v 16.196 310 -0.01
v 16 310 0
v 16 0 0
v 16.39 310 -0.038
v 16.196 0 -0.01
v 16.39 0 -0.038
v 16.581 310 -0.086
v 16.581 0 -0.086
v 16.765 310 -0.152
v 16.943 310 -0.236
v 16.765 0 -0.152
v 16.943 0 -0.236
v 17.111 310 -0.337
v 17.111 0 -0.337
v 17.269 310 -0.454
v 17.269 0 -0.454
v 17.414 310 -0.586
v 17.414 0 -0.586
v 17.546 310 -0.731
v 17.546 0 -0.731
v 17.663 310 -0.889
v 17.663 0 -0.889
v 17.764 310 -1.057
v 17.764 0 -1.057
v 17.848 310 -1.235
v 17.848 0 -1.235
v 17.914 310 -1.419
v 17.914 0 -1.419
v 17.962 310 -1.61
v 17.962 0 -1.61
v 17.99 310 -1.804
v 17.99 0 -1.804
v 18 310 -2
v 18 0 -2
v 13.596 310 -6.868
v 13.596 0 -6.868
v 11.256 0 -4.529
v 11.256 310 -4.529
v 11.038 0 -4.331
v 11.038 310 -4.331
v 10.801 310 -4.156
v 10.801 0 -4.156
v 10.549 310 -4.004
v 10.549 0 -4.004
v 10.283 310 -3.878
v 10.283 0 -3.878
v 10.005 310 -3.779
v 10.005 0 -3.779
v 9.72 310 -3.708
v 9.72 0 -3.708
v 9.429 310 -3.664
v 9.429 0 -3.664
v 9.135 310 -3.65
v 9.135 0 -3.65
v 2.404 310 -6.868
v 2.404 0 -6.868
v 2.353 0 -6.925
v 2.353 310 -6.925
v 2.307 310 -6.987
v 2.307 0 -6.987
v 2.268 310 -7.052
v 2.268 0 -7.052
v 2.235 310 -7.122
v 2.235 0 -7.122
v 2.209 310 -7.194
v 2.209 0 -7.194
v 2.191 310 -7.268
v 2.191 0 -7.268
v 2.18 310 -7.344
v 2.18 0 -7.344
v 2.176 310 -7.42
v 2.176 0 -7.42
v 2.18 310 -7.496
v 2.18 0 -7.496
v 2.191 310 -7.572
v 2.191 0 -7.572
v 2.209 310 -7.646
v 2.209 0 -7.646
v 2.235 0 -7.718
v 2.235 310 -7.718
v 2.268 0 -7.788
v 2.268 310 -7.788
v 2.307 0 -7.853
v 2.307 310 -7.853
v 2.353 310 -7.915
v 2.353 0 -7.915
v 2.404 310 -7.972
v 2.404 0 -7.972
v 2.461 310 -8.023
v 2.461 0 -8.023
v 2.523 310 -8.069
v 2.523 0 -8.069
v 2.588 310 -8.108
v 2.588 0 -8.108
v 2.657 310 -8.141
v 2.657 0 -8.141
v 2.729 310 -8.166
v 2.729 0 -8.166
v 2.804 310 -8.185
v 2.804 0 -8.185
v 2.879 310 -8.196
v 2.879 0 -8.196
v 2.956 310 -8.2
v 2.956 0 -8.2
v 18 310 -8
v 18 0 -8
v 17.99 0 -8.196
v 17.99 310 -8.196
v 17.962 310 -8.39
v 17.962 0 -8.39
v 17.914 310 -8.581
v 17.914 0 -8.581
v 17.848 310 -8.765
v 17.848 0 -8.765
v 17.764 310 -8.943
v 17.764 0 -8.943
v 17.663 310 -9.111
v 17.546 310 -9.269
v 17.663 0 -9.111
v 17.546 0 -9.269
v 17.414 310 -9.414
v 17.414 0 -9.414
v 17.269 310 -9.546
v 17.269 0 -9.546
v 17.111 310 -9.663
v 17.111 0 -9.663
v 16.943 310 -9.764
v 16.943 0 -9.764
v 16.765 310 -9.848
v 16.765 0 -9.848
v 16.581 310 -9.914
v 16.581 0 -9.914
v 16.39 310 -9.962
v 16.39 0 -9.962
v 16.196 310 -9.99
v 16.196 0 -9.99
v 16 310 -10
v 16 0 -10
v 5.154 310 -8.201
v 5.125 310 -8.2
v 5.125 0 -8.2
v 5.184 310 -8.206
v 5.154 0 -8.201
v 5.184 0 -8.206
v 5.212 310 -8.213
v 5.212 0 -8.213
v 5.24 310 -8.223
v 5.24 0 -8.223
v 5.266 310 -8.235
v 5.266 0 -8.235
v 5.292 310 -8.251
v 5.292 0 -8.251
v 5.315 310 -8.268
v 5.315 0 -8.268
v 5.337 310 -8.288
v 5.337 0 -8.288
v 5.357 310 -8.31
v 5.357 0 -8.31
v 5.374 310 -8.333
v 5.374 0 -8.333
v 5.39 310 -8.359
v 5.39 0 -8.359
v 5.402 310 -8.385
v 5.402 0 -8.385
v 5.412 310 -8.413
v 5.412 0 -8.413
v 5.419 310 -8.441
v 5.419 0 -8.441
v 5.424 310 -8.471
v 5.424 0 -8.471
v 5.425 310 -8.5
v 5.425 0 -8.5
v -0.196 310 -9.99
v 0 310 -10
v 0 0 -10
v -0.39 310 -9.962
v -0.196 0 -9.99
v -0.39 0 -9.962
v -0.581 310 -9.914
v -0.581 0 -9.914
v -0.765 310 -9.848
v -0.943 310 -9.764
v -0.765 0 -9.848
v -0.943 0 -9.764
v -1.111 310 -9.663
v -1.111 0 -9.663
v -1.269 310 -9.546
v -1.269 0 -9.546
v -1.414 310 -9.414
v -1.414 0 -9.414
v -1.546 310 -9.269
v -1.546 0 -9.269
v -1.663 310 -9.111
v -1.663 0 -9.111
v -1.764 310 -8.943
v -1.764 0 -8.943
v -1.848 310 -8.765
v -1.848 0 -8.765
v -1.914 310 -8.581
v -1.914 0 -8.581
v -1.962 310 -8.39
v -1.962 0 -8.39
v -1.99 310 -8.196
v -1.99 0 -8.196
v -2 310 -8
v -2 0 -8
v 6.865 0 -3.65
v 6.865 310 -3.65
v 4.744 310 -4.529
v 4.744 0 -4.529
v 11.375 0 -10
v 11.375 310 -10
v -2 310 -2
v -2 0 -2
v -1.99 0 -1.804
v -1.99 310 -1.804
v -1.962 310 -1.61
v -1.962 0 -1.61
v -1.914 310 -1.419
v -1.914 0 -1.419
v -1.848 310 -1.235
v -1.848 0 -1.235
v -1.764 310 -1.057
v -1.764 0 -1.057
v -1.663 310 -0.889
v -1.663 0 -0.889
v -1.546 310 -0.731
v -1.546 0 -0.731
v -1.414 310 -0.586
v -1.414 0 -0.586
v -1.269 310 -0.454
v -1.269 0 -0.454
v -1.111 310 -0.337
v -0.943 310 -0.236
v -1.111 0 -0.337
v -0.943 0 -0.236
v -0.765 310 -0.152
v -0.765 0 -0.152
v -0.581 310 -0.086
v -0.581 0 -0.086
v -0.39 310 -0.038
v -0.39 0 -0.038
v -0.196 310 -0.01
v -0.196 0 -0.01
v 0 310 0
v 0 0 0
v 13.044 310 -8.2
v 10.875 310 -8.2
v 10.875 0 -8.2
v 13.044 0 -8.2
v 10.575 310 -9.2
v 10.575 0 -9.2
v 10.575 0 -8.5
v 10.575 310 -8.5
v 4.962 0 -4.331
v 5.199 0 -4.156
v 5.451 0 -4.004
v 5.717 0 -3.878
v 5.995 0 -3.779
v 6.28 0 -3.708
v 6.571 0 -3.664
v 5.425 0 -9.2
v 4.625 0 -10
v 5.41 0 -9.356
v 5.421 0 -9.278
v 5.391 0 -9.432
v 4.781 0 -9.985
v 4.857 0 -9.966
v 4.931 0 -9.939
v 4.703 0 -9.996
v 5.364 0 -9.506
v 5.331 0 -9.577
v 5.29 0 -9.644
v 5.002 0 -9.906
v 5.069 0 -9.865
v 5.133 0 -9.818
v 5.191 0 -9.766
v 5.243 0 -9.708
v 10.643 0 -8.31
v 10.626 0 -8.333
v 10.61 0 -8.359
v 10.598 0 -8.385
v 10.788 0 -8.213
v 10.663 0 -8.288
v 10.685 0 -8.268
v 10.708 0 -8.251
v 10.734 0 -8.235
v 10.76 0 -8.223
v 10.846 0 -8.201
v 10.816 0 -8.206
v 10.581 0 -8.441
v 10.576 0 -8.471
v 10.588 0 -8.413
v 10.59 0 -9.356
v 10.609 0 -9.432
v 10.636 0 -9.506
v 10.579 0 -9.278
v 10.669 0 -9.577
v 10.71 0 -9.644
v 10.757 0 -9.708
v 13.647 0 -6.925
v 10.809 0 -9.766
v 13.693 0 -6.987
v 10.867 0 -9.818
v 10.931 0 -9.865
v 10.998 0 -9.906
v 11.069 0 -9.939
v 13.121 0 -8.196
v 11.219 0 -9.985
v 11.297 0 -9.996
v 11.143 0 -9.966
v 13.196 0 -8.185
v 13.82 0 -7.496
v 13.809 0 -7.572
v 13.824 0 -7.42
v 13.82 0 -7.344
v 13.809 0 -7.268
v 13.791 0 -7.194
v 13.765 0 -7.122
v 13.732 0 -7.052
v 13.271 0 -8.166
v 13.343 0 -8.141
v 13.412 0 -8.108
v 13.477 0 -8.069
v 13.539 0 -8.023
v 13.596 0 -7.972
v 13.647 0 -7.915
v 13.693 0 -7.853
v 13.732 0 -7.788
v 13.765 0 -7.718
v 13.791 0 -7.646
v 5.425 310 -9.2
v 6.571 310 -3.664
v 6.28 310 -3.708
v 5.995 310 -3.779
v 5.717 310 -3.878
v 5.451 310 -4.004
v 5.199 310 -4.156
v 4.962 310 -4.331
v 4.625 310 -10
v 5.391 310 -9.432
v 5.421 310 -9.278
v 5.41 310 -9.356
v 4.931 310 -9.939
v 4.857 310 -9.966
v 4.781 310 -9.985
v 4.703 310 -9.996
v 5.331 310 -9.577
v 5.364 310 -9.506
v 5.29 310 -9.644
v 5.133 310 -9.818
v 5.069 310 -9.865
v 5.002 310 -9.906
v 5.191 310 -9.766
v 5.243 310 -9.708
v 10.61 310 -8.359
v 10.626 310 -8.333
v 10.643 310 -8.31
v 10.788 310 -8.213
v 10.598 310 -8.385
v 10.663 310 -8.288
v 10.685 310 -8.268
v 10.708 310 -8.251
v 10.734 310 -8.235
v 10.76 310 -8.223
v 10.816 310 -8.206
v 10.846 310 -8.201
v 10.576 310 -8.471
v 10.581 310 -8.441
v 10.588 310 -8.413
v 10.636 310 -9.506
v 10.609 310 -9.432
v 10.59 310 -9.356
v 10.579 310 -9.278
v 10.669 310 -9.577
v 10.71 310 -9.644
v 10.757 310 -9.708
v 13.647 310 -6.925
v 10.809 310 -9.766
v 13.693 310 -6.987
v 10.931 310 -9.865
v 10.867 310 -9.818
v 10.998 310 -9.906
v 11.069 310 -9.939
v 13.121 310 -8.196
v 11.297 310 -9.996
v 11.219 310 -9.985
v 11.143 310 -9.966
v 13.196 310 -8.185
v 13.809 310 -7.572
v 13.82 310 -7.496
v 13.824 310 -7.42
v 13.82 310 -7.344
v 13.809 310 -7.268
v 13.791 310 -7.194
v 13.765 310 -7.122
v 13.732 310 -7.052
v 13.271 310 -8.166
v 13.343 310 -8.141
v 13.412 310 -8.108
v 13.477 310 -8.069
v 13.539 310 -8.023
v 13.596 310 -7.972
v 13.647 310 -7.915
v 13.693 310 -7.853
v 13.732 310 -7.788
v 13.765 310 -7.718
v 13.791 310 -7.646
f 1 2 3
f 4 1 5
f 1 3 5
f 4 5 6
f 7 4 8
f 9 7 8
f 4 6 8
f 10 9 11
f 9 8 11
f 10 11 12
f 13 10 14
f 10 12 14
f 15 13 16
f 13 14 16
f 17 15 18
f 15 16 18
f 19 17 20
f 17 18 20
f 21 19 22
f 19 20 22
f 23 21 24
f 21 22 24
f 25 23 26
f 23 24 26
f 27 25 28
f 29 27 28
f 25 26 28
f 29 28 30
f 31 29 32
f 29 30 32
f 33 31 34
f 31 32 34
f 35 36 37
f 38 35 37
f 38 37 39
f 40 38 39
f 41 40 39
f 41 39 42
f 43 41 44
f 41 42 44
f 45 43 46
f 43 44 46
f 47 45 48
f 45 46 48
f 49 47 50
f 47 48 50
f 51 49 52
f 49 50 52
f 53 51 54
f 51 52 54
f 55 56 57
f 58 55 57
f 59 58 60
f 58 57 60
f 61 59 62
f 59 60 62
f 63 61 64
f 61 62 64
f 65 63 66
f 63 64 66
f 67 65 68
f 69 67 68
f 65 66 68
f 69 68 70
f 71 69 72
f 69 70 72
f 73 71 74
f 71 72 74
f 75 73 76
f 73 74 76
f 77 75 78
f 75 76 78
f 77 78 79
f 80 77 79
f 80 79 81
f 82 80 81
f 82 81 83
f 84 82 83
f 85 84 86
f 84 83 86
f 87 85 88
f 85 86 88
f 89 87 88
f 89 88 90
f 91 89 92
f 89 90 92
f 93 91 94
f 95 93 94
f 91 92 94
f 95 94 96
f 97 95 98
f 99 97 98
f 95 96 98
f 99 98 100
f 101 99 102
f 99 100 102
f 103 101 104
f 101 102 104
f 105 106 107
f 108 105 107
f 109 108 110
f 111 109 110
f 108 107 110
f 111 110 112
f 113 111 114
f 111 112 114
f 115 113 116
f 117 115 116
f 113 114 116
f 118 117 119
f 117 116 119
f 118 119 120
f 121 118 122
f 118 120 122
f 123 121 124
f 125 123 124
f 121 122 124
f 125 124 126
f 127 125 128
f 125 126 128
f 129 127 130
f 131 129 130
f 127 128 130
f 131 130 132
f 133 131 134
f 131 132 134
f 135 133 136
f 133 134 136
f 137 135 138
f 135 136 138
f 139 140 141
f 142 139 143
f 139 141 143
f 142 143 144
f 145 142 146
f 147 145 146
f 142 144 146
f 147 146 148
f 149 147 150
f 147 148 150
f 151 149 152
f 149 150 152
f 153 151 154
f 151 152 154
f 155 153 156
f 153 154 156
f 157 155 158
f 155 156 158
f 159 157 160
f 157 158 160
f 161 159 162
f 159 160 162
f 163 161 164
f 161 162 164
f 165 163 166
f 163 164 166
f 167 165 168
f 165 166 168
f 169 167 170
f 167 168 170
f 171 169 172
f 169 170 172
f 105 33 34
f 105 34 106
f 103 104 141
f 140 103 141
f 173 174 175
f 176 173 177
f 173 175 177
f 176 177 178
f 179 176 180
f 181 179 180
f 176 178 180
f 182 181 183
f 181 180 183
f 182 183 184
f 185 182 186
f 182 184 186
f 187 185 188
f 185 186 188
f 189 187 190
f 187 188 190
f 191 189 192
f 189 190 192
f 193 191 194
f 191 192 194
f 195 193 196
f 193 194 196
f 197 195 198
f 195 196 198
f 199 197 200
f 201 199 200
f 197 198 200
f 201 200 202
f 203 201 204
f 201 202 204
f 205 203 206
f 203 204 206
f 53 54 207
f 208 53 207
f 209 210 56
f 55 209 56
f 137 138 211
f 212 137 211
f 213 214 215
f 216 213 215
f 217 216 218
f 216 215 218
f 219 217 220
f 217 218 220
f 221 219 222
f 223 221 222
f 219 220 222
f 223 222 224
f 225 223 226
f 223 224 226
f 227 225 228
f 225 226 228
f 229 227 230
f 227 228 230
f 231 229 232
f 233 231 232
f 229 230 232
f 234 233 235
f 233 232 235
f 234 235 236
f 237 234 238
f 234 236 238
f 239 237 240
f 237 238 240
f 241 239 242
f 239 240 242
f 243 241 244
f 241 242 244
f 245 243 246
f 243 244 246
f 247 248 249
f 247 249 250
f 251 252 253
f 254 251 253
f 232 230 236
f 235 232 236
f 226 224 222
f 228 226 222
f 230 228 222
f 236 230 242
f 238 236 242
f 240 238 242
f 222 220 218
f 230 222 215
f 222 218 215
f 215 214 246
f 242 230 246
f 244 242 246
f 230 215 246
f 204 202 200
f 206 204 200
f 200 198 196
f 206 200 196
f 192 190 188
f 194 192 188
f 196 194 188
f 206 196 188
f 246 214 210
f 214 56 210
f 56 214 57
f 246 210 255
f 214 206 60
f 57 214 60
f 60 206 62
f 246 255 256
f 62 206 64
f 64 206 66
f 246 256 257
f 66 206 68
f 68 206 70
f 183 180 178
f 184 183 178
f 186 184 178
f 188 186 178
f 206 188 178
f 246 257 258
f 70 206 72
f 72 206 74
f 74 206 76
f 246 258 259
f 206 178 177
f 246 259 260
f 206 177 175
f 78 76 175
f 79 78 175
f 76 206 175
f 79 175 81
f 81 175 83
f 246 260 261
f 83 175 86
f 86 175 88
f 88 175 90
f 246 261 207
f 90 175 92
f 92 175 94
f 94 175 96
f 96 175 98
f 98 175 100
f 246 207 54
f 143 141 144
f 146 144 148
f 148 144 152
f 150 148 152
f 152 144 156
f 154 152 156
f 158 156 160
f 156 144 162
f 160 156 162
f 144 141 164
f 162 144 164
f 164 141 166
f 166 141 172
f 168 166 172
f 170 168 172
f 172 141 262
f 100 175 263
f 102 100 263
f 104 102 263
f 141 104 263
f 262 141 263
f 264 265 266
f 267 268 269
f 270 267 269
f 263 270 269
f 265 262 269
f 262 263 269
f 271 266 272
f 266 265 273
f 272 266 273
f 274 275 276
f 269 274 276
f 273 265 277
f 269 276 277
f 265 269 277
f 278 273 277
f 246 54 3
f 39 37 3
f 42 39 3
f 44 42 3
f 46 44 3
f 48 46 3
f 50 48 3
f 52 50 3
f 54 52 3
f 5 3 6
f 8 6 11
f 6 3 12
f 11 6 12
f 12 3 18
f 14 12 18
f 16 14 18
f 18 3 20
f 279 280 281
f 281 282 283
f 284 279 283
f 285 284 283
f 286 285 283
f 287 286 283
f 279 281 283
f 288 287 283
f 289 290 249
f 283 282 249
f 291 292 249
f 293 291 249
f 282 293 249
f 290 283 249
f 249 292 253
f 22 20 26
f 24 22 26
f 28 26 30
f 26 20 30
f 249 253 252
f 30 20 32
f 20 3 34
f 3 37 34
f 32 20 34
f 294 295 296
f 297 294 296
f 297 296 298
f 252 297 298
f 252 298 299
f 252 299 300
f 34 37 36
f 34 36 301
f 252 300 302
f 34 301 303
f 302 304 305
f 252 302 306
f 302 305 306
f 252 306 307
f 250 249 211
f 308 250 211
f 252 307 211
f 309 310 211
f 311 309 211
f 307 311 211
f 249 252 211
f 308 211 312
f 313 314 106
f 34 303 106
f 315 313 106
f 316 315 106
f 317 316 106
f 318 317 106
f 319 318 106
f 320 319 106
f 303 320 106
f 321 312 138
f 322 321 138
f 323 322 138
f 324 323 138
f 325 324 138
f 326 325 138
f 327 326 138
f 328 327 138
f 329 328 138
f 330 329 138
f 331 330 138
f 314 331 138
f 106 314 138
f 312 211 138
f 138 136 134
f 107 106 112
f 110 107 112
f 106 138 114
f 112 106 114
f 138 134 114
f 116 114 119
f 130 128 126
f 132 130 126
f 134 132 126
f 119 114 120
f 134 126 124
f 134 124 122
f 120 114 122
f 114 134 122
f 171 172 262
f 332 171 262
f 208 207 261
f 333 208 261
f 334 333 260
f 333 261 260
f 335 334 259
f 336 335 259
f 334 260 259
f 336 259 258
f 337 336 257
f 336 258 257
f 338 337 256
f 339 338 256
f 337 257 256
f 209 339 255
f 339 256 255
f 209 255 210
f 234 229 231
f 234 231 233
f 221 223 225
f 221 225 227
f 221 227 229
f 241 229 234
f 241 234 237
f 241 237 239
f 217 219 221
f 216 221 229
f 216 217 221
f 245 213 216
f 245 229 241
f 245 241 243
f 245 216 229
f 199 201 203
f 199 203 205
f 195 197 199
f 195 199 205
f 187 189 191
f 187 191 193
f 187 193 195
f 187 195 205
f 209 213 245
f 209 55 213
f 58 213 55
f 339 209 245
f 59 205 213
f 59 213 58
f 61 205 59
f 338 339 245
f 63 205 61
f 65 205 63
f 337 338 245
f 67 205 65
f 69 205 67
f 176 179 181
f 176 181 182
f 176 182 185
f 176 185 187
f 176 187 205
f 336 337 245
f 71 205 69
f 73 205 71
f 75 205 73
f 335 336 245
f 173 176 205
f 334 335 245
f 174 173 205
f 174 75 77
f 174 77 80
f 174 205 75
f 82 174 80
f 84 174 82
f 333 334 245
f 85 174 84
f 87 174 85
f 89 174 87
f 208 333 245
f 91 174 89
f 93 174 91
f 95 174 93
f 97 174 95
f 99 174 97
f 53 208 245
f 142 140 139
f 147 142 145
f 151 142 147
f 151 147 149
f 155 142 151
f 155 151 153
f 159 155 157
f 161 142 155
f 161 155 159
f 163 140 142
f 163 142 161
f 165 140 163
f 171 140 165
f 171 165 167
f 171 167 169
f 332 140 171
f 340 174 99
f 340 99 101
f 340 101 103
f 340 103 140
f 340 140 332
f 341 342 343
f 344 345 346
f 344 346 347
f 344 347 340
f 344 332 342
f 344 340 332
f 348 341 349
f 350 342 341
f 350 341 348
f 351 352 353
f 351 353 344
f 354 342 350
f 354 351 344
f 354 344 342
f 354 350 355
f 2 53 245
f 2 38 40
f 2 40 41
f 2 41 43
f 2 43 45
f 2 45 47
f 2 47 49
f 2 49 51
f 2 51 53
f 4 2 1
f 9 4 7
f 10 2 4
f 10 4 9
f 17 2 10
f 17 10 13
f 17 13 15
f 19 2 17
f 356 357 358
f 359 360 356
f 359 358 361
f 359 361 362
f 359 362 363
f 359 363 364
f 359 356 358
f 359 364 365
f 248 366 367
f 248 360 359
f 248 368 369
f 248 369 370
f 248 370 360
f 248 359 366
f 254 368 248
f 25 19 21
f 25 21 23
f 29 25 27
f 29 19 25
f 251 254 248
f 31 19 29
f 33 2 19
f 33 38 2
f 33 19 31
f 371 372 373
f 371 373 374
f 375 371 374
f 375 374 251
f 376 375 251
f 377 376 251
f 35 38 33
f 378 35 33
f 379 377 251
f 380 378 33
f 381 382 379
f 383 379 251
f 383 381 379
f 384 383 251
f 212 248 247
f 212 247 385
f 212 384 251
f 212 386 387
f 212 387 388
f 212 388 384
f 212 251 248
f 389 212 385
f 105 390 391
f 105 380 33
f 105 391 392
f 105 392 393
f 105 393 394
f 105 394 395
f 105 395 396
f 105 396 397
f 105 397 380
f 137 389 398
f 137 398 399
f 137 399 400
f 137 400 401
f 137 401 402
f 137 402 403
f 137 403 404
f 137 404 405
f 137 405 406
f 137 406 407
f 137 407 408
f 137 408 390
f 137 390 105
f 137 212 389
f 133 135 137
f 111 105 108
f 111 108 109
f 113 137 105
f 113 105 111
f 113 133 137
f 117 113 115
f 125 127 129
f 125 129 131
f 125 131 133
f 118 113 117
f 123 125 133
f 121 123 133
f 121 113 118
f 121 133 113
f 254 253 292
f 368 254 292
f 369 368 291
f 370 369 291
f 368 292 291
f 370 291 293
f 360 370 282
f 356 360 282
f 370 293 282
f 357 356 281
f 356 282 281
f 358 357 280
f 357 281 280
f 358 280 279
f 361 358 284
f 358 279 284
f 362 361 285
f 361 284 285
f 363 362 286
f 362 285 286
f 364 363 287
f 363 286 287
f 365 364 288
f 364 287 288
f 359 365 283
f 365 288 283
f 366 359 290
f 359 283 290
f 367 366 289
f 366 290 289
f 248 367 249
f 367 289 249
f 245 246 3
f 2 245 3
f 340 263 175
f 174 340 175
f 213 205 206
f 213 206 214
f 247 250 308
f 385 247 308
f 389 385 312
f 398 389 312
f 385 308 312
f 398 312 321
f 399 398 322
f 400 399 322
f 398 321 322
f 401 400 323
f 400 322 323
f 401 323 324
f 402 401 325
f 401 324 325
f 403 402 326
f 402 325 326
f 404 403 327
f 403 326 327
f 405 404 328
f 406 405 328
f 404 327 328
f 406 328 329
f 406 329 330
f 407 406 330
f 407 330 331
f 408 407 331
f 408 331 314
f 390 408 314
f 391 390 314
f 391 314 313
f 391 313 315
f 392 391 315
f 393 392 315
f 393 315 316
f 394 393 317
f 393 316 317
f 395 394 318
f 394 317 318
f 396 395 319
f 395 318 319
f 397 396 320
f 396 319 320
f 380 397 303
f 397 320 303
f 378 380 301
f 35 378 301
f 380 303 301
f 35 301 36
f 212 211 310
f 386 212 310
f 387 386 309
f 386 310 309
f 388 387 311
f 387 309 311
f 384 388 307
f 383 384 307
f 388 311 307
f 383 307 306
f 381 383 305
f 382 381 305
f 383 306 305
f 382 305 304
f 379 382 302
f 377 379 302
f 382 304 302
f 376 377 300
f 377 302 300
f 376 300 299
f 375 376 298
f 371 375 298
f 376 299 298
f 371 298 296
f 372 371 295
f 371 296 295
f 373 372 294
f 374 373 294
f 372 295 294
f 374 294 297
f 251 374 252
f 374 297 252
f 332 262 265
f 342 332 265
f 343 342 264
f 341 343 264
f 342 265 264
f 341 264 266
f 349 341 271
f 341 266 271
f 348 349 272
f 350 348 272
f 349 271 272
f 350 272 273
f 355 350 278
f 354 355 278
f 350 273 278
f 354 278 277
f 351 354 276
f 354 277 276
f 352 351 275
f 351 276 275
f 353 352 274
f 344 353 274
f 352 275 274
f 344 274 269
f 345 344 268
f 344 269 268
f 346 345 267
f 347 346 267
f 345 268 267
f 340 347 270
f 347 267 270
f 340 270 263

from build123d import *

# Parameters (mm, degrees)
SALIENTE_EXTRUIR1_DEPTH = 310


with BuildPart() as part:
    # Croquis1 → Saliente-Extruir1 (new body)
    with BuildSketch(Plane(origin=(0, 0, 0), x_dir=(1, 0, 0), z_dir=(0, 1, 0))):
        with BuildLine():
            Line((4.625, 10), (0, 10))
            ThreePointArc((0, 10), (-1.414213562, 9.414213562), (-2, 8))
            Line((-2, 8), (-2, 2))
            ThreePointArc((-2, 2), (-1.414213562, 0.585786438), (0, 0))
            Line((0, 0), (16, 0))
            ThreePointArc((16, 0), (17.414213562, 0.585786438), (18, 2))
            Line((18, 2), (18, 8))
            ThreePointArc((18, 8), (17.41421361, 9.41421365), (16, 10.000000135))
            Line((16, 10.000000135), (11.374999664, 10.000000135))
            ThreePointArc((11.374999664, 10.000000135), (10.809314239, 9.76568556), (10.574999664, 9.200000135))
            Line((10.574999664, 9.200000135), (10.574999664, 8.500000898))
            ThreePointArc((10.574999664, 8.500000898), (10.662867611, 8.287868883), (10.87499961, 8.200000898))
            Line((10.87499961, 8.200000898), (13.044121001, 8.200000507))
            ThreePointArc((13.044121001, 8.200000507), (13.764747104, 7.718493399), (13.595664288, 6.868456885))
            Line((13.595664288, 6.868456885), (11.255887257, 4.528679854))
            ThreePointArc((11.255887257, 4.528679854), (10.282617211, 3.8783616), (9.134566914, 3.650000197))
            Line((9.134566914, 3.650000197), (6.865432698, 3.650000197))
            ThreePointArc((6.865432698, 3.650000197), (5.7173824, 3.878361599), (4.744112353, 4.528679854))
            Line((4.744112353, 4.528679854), (2.404335323, 6.868456883))
            ThreePointArc((2.404335323, 6.868456883), (2.23525255, 7.718493184), (2.955878471, 8.200000172))
            Line((2.955878471, 8.200000172), (5.124999858, 8.200000566))
            ThreePointArc((5.124999858, 8.200000566), (5.337131996, 8.287868609), (5.425, 8.500000763))
            Line((5.425, 8.500000763), (5.425, 9.2))
            ThreePointArc((5.425, 9.2), (5.190685425, 9.765685425), (4.625, 10))
        make_face()
    extrude(amount=SALIENTE_EXTRUIR1_DEPTH)


solid = part.part
